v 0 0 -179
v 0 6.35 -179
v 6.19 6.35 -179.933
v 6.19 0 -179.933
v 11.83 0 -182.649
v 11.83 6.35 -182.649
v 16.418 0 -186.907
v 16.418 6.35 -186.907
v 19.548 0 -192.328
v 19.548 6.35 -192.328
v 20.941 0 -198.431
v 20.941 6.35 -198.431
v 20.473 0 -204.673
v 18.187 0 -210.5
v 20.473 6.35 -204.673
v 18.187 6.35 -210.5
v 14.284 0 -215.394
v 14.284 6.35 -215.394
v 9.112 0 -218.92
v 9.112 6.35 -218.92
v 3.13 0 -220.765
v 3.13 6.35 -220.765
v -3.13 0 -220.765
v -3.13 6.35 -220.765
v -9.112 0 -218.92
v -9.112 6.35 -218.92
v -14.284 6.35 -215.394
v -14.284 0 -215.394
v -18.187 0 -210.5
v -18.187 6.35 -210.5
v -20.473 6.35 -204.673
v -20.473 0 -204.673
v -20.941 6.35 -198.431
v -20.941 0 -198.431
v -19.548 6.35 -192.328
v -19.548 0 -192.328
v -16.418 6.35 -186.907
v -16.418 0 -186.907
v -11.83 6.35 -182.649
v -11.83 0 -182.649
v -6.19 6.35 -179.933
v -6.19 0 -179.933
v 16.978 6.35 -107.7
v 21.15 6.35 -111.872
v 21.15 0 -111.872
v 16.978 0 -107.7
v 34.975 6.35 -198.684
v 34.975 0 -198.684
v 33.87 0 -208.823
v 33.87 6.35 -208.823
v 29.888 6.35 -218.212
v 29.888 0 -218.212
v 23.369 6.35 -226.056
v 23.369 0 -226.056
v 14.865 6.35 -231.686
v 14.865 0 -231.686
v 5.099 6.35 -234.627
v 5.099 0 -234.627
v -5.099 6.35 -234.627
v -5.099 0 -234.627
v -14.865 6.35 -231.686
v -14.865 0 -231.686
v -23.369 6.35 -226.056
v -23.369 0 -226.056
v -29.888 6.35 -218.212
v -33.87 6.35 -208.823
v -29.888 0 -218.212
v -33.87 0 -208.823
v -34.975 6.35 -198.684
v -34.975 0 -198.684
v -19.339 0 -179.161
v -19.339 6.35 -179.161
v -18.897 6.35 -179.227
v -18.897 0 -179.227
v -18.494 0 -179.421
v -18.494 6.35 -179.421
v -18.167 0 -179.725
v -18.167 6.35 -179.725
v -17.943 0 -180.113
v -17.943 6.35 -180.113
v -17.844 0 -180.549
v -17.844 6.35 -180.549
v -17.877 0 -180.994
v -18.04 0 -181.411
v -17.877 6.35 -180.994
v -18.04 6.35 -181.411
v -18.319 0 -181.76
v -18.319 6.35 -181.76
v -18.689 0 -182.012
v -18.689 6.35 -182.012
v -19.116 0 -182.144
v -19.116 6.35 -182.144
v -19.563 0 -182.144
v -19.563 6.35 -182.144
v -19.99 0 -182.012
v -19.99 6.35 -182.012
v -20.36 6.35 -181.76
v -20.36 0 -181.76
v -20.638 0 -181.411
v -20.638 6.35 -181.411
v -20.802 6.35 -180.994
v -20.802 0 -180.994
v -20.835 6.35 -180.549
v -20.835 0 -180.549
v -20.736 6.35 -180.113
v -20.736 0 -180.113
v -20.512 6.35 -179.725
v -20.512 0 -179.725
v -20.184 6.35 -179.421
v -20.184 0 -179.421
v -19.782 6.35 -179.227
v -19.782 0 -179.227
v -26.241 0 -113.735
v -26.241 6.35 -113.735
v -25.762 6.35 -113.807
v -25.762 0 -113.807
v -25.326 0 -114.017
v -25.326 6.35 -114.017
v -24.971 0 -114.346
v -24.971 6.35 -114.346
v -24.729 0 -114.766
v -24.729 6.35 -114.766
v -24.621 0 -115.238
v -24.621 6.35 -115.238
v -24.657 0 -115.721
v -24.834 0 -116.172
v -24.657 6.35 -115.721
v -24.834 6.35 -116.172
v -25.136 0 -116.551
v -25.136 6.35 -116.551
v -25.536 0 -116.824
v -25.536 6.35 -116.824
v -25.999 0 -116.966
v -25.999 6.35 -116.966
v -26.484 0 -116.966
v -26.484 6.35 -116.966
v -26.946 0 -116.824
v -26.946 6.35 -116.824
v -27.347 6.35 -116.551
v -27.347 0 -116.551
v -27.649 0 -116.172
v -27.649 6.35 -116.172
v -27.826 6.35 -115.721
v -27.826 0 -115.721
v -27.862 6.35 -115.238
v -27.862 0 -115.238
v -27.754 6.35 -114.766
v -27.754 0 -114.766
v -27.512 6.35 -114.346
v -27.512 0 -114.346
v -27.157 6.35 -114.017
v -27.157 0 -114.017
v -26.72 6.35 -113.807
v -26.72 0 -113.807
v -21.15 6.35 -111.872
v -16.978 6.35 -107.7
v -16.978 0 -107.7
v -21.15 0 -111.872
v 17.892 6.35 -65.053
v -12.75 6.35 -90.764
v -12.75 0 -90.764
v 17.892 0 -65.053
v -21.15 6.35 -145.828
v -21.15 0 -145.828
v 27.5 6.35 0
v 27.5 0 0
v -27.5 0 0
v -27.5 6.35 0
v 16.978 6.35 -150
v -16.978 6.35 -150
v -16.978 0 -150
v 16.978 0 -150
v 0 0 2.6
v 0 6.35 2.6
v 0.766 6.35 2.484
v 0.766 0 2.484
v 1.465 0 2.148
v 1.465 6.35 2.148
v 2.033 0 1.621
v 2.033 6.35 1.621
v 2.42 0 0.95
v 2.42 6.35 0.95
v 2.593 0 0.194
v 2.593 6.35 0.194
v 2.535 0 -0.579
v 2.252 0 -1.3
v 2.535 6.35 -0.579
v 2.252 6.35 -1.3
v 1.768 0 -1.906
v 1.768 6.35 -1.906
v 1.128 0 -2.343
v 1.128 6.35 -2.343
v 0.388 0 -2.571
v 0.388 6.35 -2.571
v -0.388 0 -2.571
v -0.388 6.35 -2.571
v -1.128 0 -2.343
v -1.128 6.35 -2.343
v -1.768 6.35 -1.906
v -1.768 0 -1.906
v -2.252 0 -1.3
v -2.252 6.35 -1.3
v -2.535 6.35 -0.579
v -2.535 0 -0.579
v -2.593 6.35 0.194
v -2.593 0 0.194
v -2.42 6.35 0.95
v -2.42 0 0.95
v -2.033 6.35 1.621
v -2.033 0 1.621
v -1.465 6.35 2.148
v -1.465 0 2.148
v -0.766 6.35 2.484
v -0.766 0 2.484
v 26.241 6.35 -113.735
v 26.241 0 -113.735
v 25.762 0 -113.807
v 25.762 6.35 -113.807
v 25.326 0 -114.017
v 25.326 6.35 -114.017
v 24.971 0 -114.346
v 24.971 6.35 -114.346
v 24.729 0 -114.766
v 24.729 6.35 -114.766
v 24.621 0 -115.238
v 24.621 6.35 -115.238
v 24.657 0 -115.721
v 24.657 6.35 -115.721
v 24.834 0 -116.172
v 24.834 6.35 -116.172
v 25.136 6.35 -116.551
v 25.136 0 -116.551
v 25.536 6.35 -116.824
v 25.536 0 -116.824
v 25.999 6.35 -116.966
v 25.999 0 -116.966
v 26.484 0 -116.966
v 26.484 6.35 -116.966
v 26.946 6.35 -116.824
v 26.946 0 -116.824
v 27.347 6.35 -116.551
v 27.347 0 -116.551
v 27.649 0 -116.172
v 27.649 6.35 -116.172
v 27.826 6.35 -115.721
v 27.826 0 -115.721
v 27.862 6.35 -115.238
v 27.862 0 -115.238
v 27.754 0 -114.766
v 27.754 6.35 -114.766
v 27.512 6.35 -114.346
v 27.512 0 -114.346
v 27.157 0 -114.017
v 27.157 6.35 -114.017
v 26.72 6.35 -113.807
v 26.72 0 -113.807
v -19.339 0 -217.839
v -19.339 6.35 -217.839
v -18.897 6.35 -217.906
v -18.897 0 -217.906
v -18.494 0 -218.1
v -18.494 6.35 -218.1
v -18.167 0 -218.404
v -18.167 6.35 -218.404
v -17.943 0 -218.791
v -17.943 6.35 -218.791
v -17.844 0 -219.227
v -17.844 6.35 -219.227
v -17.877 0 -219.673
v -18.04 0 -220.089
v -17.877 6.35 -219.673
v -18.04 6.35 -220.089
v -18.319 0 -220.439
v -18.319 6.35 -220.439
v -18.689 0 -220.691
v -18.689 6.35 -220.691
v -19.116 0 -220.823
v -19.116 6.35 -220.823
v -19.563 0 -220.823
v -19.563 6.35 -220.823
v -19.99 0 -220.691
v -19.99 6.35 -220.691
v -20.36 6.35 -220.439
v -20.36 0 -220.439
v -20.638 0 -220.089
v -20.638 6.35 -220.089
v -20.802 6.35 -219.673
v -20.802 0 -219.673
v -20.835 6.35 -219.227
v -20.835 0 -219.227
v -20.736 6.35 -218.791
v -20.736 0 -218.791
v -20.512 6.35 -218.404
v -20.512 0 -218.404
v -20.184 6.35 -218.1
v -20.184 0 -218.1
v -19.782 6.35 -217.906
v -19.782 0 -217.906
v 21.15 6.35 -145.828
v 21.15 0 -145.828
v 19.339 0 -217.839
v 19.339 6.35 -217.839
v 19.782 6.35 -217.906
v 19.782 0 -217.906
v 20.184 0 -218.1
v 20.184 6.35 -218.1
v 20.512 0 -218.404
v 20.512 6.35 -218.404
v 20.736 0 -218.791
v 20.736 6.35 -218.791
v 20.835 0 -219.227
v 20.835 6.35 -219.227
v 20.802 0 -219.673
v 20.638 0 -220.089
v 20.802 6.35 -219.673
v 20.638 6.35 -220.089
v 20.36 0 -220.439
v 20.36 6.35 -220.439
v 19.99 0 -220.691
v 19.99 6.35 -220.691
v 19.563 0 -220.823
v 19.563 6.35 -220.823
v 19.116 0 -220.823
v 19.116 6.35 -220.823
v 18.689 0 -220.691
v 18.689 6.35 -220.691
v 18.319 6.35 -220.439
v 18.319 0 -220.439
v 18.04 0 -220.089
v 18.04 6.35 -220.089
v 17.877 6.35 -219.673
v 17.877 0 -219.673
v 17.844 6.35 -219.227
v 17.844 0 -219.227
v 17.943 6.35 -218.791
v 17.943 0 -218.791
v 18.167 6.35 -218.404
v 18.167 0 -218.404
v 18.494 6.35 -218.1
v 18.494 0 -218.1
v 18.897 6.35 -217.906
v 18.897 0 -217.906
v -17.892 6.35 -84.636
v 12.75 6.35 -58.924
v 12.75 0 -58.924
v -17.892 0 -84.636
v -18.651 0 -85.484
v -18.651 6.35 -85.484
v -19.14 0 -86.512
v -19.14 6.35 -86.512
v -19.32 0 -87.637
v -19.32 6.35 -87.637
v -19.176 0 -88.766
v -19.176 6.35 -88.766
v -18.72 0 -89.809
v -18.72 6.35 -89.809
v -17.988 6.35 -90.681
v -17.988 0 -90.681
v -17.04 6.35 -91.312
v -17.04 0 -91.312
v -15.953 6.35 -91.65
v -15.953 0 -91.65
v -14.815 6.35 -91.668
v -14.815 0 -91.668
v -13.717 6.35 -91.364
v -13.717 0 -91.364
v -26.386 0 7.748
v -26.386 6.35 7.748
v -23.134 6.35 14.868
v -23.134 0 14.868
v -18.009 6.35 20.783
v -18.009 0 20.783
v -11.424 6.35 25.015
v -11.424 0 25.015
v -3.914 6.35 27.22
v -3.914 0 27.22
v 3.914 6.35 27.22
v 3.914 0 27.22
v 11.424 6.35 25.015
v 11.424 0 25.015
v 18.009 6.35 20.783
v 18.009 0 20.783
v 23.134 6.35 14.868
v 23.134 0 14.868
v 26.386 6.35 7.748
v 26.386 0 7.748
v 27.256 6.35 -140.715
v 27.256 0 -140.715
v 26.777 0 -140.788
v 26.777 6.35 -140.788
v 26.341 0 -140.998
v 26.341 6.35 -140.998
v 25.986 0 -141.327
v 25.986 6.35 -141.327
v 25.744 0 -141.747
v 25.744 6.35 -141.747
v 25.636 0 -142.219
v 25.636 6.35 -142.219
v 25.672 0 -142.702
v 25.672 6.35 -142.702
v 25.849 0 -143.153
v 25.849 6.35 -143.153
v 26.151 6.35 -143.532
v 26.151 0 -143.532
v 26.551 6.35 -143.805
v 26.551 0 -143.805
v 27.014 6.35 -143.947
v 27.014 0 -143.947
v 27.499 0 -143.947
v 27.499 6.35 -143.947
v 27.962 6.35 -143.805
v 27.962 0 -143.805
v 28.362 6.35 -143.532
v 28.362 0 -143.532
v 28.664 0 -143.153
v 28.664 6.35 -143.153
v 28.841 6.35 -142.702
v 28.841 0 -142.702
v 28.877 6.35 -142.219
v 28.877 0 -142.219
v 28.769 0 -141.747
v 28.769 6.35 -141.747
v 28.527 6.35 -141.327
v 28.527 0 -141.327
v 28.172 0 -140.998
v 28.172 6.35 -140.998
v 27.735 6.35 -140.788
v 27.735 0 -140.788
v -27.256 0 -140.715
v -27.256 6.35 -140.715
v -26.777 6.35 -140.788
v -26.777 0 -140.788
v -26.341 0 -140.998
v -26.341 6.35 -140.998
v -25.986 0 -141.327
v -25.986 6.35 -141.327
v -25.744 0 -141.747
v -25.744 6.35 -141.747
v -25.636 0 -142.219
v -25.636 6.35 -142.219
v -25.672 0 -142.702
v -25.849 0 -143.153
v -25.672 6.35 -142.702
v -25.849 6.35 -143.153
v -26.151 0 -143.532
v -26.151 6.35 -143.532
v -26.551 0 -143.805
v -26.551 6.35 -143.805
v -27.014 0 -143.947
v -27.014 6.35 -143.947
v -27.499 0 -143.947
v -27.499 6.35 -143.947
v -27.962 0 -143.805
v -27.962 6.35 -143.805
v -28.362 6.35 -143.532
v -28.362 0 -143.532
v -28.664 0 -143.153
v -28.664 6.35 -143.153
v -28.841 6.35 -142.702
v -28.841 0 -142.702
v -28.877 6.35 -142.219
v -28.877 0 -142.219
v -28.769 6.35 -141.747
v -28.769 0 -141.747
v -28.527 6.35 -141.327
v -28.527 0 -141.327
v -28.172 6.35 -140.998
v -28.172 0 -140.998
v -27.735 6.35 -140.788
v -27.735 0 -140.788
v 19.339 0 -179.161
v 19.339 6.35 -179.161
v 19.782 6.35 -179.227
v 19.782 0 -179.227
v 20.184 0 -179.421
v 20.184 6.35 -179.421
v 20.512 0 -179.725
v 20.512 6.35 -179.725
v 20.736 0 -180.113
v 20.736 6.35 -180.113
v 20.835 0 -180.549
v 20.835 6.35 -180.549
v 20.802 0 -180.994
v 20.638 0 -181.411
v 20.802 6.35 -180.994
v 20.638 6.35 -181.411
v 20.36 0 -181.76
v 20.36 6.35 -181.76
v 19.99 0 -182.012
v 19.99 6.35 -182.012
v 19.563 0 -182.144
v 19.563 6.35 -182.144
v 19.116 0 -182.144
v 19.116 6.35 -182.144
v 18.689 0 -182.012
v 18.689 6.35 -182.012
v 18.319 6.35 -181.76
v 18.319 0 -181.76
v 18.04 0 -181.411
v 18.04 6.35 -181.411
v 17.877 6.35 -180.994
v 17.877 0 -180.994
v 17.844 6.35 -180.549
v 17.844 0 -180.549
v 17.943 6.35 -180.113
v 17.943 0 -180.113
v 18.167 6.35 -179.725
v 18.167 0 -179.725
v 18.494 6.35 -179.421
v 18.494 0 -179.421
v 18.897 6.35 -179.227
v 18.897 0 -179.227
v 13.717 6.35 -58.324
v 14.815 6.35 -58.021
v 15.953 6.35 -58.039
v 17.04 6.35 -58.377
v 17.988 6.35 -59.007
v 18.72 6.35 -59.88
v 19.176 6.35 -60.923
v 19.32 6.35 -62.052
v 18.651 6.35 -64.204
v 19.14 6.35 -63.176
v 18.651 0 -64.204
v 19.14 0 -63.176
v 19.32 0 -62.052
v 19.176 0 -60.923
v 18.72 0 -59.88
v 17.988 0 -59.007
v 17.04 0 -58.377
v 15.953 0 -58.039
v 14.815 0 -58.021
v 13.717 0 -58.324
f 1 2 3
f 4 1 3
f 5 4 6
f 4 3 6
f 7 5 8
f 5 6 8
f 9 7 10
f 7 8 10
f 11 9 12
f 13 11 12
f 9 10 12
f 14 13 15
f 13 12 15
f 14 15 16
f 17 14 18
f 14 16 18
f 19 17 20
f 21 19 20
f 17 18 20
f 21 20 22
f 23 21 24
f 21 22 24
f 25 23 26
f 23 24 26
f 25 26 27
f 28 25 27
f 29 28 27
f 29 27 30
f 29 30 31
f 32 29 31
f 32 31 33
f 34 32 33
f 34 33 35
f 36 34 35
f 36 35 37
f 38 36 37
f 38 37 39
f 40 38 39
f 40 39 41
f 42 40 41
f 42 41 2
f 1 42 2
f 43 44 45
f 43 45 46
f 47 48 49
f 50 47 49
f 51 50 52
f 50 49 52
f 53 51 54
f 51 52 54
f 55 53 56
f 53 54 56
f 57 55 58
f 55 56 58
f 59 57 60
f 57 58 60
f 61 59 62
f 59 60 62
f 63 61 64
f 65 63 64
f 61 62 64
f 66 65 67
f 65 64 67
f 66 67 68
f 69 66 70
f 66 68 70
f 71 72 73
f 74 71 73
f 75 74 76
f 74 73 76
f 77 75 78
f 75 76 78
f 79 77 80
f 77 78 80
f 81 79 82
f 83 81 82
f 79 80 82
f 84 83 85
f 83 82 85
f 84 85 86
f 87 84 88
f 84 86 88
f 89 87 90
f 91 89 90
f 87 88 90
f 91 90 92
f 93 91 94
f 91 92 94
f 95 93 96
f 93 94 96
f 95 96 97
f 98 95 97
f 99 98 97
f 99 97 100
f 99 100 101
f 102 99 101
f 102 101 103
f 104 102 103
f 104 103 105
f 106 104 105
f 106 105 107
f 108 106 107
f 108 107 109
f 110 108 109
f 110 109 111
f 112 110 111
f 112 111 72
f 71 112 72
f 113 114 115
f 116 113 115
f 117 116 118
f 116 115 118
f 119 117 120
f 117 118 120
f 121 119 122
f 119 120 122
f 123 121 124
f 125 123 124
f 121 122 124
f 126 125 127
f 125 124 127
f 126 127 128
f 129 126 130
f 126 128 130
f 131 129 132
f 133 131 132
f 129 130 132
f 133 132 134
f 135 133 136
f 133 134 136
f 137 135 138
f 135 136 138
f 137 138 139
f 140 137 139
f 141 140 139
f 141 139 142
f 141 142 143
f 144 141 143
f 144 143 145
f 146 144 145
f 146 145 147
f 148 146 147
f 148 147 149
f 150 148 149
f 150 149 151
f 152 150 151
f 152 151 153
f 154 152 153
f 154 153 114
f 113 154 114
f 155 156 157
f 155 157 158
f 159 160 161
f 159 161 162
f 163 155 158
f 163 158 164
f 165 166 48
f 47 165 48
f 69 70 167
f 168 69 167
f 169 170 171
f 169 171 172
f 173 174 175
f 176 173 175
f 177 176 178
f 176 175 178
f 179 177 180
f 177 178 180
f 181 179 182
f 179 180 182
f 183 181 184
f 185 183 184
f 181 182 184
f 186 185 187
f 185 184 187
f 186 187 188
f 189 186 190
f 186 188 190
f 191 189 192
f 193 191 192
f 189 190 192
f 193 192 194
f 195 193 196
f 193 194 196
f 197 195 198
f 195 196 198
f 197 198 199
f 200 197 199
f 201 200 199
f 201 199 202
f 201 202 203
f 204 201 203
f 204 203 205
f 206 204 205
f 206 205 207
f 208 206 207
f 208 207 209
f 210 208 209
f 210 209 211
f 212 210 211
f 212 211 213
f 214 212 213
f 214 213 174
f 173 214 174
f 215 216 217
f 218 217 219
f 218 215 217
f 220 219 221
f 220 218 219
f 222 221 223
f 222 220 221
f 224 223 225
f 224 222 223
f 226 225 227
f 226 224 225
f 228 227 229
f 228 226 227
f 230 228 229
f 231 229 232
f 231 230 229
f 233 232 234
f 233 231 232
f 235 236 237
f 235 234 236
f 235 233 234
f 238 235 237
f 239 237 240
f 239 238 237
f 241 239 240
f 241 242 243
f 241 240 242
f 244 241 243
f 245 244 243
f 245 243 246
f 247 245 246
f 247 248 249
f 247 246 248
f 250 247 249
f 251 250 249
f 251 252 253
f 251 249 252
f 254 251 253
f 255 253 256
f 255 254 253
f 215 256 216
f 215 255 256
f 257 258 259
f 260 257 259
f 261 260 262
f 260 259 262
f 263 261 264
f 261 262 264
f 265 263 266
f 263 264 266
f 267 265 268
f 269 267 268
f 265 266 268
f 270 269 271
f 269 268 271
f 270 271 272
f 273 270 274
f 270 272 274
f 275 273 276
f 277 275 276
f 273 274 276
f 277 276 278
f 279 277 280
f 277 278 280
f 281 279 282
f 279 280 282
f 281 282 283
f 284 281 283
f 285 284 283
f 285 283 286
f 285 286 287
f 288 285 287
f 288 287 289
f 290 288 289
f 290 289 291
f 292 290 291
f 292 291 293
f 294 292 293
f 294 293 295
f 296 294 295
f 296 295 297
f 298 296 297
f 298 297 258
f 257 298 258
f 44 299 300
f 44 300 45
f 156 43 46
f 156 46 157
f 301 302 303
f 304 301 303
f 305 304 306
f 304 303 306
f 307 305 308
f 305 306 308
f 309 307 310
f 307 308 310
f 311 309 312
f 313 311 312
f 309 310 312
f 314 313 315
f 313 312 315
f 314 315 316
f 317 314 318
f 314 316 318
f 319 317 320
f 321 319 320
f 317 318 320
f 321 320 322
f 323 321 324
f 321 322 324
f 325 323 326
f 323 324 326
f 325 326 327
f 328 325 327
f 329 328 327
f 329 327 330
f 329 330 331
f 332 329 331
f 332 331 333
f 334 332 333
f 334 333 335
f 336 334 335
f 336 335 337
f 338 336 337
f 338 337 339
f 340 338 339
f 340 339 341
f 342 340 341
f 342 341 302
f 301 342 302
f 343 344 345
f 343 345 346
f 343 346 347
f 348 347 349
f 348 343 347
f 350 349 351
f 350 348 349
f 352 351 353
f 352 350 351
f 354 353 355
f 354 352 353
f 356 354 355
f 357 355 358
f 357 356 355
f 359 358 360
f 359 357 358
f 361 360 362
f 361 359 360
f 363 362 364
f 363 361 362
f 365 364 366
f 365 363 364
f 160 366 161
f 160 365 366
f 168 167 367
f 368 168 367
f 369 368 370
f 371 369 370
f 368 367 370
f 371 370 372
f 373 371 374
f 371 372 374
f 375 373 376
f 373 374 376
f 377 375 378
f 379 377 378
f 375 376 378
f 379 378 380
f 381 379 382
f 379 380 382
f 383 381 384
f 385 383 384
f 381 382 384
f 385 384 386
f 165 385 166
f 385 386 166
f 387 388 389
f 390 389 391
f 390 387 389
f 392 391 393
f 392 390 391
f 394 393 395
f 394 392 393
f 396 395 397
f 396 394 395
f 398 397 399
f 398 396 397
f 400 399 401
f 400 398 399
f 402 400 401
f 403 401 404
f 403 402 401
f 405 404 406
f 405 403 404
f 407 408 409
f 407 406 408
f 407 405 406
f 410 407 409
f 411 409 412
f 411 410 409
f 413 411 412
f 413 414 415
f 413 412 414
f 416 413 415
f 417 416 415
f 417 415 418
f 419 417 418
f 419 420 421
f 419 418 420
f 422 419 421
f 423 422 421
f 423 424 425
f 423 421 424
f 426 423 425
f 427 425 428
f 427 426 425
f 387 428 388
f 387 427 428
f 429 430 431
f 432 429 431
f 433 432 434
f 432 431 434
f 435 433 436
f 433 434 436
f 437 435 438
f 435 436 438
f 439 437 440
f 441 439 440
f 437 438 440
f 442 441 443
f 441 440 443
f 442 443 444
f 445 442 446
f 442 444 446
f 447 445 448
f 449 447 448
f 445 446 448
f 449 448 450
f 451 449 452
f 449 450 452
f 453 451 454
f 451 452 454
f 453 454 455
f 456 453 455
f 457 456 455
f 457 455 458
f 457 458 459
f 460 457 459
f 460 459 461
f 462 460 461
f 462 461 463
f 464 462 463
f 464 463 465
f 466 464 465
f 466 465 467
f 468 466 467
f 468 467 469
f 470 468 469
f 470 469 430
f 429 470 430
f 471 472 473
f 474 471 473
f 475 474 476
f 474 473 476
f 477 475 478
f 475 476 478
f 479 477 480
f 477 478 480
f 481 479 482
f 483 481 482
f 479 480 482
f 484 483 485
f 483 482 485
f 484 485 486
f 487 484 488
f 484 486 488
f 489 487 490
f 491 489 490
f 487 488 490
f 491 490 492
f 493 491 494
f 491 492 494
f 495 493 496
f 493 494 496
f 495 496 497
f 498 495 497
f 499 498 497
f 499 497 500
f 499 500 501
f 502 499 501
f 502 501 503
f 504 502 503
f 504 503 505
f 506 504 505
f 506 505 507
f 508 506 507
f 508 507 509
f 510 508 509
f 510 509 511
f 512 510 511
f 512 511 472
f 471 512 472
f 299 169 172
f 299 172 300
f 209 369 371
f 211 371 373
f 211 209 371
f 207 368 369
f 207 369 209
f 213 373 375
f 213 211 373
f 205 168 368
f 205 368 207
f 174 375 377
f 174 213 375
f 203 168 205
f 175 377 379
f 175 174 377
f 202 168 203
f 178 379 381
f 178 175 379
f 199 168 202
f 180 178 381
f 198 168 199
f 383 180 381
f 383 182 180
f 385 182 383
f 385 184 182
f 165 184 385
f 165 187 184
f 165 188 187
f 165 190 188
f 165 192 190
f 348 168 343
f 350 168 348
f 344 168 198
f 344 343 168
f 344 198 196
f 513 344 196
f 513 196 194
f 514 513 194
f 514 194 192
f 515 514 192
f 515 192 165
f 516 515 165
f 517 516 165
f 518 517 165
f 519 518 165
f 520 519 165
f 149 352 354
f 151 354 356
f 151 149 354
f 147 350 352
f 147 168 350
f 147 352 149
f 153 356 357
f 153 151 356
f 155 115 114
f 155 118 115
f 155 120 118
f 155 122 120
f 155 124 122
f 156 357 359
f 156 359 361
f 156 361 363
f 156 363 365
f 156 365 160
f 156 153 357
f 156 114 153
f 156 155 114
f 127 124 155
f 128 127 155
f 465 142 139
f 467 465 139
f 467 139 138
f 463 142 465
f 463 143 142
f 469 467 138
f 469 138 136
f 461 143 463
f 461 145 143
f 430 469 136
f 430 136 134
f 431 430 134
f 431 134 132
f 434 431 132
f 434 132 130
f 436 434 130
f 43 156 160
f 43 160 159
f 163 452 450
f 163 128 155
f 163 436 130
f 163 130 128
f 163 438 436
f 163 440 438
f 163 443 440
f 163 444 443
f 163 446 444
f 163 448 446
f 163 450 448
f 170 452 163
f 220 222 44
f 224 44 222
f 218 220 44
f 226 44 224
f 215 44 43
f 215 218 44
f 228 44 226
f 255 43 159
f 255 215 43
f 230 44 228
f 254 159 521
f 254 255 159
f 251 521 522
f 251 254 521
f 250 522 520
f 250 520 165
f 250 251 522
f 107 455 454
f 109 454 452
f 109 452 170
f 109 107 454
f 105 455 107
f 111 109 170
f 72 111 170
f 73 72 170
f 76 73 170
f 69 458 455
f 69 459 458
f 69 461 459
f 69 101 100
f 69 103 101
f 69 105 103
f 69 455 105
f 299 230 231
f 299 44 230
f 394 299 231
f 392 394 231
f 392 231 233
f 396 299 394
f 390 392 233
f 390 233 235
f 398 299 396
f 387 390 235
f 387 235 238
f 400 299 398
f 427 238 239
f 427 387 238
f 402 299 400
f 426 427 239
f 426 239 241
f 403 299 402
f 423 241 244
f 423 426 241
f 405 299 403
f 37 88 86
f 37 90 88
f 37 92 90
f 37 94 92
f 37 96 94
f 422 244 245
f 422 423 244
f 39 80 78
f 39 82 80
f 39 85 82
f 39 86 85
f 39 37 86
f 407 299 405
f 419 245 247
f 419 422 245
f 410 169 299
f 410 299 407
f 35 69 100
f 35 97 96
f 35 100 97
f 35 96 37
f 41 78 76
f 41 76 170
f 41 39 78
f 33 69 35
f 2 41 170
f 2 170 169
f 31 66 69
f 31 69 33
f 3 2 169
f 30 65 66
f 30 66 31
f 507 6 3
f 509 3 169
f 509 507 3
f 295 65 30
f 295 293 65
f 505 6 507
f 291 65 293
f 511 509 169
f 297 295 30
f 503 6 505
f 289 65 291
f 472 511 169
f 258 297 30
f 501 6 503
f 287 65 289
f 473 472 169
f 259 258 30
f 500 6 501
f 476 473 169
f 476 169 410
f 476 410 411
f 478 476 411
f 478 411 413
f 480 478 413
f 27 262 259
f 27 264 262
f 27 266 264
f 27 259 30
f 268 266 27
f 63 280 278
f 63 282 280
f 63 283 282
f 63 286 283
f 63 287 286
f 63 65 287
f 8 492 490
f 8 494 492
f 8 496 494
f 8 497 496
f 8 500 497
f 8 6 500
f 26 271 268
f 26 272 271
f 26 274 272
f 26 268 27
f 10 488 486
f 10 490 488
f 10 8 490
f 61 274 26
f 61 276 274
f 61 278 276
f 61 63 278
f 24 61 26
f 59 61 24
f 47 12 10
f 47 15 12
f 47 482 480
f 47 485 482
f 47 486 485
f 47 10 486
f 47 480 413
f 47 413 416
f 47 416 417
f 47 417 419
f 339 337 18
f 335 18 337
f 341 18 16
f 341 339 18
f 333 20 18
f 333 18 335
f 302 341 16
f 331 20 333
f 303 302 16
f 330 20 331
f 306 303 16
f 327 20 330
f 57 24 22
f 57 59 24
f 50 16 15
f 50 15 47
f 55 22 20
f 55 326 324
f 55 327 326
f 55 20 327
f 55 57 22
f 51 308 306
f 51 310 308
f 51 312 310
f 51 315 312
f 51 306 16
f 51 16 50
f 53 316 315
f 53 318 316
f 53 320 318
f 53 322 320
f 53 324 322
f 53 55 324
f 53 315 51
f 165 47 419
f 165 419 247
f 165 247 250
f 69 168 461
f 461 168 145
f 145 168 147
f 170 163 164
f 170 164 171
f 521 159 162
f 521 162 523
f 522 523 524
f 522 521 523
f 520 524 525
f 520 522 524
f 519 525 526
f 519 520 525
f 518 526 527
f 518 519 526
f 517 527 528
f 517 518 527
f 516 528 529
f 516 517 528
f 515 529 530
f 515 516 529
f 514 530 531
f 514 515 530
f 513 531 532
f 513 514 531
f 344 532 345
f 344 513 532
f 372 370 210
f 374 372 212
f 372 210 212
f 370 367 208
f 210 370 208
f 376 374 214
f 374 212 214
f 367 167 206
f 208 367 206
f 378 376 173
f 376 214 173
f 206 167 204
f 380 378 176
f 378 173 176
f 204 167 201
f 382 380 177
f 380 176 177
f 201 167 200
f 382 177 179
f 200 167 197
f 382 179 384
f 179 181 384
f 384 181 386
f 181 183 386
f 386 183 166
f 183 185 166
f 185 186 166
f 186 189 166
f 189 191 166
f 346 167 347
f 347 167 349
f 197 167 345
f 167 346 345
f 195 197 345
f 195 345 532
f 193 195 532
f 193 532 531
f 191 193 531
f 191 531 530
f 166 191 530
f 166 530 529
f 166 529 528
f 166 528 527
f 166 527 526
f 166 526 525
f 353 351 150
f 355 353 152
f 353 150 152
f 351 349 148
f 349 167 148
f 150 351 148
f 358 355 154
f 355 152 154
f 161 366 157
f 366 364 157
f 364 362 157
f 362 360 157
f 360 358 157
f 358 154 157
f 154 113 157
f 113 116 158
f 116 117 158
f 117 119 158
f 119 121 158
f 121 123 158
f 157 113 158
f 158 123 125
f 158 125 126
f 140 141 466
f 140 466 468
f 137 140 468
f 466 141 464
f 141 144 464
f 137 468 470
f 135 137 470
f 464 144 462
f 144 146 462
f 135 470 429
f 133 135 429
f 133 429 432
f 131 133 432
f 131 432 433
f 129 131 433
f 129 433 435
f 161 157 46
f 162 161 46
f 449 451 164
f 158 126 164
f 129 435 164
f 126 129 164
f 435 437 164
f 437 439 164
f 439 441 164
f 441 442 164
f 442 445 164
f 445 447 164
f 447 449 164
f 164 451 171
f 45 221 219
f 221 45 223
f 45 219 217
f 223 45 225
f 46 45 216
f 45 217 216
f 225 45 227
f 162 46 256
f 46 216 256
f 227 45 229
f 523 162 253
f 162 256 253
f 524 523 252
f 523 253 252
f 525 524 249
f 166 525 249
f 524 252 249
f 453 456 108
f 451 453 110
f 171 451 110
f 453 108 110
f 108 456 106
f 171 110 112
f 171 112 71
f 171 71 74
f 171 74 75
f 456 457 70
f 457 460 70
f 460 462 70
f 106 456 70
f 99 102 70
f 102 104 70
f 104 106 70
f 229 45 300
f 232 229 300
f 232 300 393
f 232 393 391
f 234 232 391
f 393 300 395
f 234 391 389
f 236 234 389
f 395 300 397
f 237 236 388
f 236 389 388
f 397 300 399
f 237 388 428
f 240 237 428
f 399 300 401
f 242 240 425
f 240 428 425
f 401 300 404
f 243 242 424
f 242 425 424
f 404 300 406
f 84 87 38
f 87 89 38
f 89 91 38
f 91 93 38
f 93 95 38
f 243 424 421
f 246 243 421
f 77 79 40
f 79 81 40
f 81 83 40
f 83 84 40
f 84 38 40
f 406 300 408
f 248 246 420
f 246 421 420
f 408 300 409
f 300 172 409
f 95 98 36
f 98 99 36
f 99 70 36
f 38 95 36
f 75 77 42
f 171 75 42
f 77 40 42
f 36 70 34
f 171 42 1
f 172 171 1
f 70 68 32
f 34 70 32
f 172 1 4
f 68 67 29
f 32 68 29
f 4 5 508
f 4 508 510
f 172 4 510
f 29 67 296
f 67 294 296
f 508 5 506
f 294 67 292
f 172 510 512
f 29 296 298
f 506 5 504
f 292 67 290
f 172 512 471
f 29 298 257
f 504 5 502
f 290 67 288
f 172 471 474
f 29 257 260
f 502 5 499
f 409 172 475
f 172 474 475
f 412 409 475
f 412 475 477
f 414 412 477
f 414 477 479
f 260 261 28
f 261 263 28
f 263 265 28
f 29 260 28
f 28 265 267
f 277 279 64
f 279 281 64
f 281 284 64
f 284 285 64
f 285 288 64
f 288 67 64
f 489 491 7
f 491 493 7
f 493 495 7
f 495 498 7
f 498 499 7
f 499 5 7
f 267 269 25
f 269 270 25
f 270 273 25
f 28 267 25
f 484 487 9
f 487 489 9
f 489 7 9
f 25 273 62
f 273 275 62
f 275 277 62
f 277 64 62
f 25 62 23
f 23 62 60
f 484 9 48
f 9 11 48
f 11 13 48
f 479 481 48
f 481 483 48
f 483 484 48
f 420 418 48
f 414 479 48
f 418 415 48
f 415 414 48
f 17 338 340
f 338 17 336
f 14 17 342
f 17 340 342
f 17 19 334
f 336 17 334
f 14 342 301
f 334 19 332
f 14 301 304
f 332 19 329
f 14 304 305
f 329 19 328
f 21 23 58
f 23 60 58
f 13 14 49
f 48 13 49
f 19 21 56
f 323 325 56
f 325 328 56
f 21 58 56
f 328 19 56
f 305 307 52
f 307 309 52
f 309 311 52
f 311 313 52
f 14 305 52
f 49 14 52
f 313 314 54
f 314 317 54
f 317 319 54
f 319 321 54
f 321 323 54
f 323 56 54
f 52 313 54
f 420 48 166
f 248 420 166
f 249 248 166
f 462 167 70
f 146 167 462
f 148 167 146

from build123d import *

# Parameters (mm, degrees)
BOSS_EXTRUDE1_DEPTH     = 6.35
SKETCH2_R               = 2.6
CUT_EXTRUDE1_DEPTH      = 238.676928834
ESQUISSE3_R             = 21
ENL_V_MAT_EXTRU_2_DEPTH = 238.676928834
ESQUISSE7_R             = 1.5
ENL_V_MAT_EXTRU_3_DEPTH = 238.676928834
CUT_EXTRUDE2_DEPTH      = 238.676928834
SKETCH5_R               = 1.625
CUT_EXTRUDE3_DEPTH      = 238.676928834
CUT_EXTRUDE5_DEPTH      = 238.676928834


with BuildPart() as part:
    # Sketch1 → Boss-Extrude1 (new body)
    with BuildSketch(Plane(origin=(0, 0, 0), x_dir=(1, 0, 0), z_dir=(0, 1, 0))):
        with BuildLine():
            Line((27.5, 0), (34.975254116, 198.684097441))
            ThreePointArc((34.975254116, 198.684097441), (0, 235), (-34.975254116, 198.684097441))
            Line((-34.975254116, 198.684097441), (-27.5, 0))
            ThreePointArc((-27.5, 0), (0, -27.5), (27.5, 0))
        make_face()
    extrude(amount=BOSS_EXTRUDE1_DEPTH)

    # Sketch2 → Cut-Extrude1 (cut, through all)
    with BuildSketch(Plane(origin=(0, 6.35, 0), x_dir=(1, 0, 0), z_dir=(0, 1, 0))):
        with Locations(Location((0, 0, 0), (0, 0, 270))):
            Circle(SKETCH2_R)
    extrude(amount=-CUT_EXTRUDE1_DEPTH, mode=Mode.SUBTRACT)

    # Esquisse3 → Enlèv. mat.-Extru.2 (cut, through all)
    with BuildSketch(Plane(origin=(0, 6.35, 0), x_dir=(1, 0, 0), z_dir=(0, 1, 0))):
        with Locations(Location((0, 200, 0), (0, 0, 270))):
            Circle(ESQUISSE3_R)
    extrude(amount=-ENL_V_MAT_EXTRU_2_DEPTH, mode=Mode.SUBTRACT)

    # Esquisse7 → Enlèv. mat.-Extru.3 (cut, through all)
    with BuildSketch(Plane(origin=(0, 6.35, 0), x_dir=(1, 0, 0), z_dir=(0, 1, 0))):
        with Locations(Location((-19.339370465, 219.339370465, 0), (0, 0, 270))):
            Circle(ESQUISSE7_R)
        with Locations(Location((19.339370465, 219.339370465, 0), (0, 0, 270))):
            Circle(ESQUISSE7_R)
        with Locations(Location((19.339370465, 180.660629535, 0), (0, 0, 270))):
            Circle(ESQUISSE7_R)
        with Locations(Location((-19.339370465, 180.660629535, 0), (0, 0, 270))):
            Circle(ESQUISSE7_R)
    extrude(amount=-ENL_V_MAT_EXTRU_3_DEPTH, mode=Mode.SUBTRACT)

    # Sketch3 → Cut-Extrude2 (cut, through all)
    with BuildSketch(Plane(origin=(0, 6.35, 0), x_dir=(1, 0, 0), z_dir=(0, 1, 0))):
        Polygon((21.15, 145.828069991), (21.15, 111.871930009), (16.978069991, 107.7), (-16.978069991, 107.7), (-21.15, 111.871930009), (-21.15, 145.828069991), (-16.978069991, 150), (16.978069991, 150), align=None)
    extrude(amount=-CUT_EXTRUDE2_DEPTH, mode=Mode.SUBTRACT)

    # Sketch5 → Cut-Extrude3 (cut, through all)
    with BuildSketch(Plane(origin=(0, 6.35, 0), x_dir=(1, 0, 0), z_dir=(0, 1, 0))):
        with Locations(Location((-27.256476824, 142.340455159, 0), (0, 0, 270))):
            Circle(SKETCH5_R)
        with Locations(Location((-26.241351992, 115.359544841, 0), (0, 0, 270))):
            Circle(SKETCH5_R)
    cut_extrude3 = extrude(amount=-CUT_EXTRUDE3_DEPTH, mode=Mode.SUBTRACT)

    # Mirror1: Cut-Extrude3 across plane
    add(cut_extrude3.mirror(Plane(origin=(0, 0, 0), x_dir=(0, 0, 1), z_dir=(1, 0, 0))), mode=Mode.SUBTRACT)

    # Sketch8 → Cut-Extrude5 (cut, through all)
    with BuildSketch(Plane(origin=(0, 6.35, 0), x_dir=(1, 0, 0), z_dir=(0, 1, 0))):
        with BuildLine():
            Line((-12.749738424, 90.764177772), (17.892039301, 65.052673385))
            ThreePointArc((17.892039301, 65.052673385), (18.385066635, 59.417345174), (12.749738424, 58.92431784))
            Line((12.749738424, 58.92431784), (-17.892039301, 84.635822228))
            ThreePointArc((-17.892039301, 84.635822228), (-18.385066635, 90.271150439), (-12.749738424, 90.764177772))
        make_face()
    extrude(amount=-CUT_EXTRUDE5_DEPTH, mode=Mode.SUBTRACT)


solid = part.part
